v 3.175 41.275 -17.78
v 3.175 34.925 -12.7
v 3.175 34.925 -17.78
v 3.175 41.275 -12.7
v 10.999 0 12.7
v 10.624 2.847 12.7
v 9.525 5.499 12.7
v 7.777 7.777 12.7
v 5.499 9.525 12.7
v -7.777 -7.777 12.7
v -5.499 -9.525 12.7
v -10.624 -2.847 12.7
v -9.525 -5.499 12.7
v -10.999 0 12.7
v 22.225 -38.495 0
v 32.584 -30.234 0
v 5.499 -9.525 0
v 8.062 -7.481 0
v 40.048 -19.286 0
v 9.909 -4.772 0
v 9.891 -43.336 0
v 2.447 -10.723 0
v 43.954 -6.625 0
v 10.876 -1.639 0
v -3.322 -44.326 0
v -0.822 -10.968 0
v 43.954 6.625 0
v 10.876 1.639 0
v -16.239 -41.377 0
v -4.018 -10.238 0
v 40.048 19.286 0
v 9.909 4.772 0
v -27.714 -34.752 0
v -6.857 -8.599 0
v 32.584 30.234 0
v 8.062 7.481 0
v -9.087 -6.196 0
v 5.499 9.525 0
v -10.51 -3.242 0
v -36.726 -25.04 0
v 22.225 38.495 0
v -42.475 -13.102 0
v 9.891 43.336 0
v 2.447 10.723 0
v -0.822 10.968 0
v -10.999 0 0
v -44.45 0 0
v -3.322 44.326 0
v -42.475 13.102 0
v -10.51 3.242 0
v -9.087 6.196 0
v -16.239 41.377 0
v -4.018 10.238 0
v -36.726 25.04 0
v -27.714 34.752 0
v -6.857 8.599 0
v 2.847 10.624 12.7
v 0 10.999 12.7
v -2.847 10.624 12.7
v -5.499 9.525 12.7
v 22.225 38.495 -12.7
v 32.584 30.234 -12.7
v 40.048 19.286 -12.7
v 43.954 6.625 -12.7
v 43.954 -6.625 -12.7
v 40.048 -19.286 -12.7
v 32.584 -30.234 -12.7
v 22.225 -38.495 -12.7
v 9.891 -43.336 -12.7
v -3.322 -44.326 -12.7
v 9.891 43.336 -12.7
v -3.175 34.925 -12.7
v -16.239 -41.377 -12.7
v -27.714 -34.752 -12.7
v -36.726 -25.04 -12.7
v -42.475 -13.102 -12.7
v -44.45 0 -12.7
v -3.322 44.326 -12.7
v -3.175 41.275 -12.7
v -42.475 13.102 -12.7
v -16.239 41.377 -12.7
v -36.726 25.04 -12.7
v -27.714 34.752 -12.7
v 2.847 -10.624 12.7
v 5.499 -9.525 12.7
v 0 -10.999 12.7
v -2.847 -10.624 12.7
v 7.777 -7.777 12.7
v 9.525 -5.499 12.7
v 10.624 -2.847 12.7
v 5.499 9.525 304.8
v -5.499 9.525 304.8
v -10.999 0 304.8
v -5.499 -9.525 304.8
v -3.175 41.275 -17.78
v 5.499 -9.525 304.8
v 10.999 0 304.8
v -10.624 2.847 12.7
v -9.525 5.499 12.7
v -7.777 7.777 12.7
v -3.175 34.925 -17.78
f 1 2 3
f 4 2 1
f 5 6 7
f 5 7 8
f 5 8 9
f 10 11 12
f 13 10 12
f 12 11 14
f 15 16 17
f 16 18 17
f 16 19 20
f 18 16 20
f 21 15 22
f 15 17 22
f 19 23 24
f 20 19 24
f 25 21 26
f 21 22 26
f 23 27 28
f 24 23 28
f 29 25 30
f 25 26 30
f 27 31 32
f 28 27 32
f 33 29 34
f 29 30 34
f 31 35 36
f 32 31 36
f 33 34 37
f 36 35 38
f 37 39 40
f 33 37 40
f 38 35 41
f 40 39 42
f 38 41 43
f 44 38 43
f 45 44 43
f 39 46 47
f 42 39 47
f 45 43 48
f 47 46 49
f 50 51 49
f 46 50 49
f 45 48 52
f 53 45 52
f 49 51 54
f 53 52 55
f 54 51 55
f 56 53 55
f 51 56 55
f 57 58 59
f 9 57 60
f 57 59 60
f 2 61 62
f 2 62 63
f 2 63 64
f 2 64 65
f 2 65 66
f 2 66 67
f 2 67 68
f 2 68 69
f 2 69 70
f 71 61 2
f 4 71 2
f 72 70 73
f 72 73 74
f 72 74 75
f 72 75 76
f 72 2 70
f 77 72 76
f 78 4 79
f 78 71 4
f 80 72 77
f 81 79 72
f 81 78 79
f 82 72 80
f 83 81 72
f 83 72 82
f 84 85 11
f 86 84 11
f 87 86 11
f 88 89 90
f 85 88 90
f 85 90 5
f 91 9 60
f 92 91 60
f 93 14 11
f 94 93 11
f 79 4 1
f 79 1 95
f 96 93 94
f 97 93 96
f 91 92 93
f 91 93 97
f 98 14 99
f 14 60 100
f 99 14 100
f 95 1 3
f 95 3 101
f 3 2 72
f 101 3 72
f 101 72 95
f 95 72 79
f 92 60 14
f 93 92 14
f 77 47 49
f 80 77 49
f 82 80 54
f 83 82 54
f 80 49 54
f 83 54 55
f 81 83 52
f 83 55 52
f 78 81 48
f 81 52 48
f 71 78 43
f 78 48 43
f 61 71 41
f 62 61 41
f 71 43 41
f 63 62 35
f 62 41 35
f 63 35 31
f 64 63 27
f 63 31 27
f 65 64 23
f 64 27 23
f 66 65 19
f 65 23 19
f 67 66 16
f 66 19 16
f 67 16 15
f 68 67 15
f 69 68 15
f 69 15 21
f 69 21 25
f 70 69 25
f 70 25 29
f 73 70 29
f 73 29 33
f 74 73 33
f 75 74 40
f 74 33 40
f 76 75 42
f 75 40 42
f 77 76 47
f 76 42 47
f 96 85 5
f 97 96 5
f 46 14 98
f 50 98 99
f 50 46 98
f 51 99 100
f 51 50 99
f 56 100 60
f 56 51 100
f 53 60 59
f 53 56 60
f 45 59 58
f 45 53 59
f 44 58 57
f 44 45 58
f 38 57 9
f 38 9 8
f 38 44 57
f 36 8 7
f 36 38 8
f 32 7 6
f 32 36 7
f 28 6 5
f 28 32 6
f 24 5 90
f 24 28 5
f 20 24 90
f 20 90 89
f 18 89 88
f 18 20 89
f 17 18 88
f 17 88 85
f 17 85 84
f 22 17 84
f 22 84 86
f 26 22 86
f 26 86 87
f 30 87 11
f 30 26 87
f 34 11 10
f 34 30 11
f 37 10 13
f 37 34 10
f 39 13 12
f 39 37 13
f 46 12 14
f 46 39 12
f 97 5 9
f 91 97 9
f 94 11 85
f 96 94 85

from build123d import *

# Parameters (mm, degrees)
BOSS_EXTRUDE1_DEPTH = 304.8
SKETCH2_R           = 10.998522628
BOSS_EXTRUDE2_DEPTH = 12.7
SKETCH3_R           = 44.45
BOSS_EXTRUDE3_DEPTH = 12.7
SKETCH4_W           = 6.35
SKETCH4_H           = 6.35
BOSS_EXTRUDE4_DEPTH = 5.08


with BuildPart() as part:
    # Sketch1 → Boss-Extrude1 (new body)
    with BuildSketch(Plane.XY):
        Polygon((5.499261314, 9.525), (-5.499261314, 9.525), (-10.998522628, 0), (-5.499261314, -9.525), (5.499261314, -9.525), (10.998522628, 0), align=None)
    extrude(amount=BOSS_EXTRUDE1_DEPTH)

    # Sketch2 → Boss-Extrude2 (add)
    with BuildSketch(Plane(origin=(0, 0, 0), x_dir=(-1, 0, 0), z_dir=(0, 0, -1))):
        Circle(SKETCH2_R)
    extrude(amount=-BOSS_EXTRUDE2_DEPTH)

    # Sketch3 → Boss-Extrude3 (add)
    with BuildSketch(Plane(origin=(0, 0, 0), x_dir=(-1, 0, 0), z_dir=(0, 0, -1))):
        Circle(SKETCH3_R)
    extrude(amount=BOSS_EXTRUDE3_DEPTH)

    # Sketch4 → Boss-Extrude4 (add)
    with BuildSketch(Plane(origin=(0, 0, -12.7), x_dir=(-1, 0, 0), z_dir=(0, 0, -1))):
        with Locations((0, 38.1)):
            Rectangle(SKETCH4_W, SKETCH4_H)
    extrude(amount=BOSS_EXTRUDE4_DEPTH)


solid = part.part
